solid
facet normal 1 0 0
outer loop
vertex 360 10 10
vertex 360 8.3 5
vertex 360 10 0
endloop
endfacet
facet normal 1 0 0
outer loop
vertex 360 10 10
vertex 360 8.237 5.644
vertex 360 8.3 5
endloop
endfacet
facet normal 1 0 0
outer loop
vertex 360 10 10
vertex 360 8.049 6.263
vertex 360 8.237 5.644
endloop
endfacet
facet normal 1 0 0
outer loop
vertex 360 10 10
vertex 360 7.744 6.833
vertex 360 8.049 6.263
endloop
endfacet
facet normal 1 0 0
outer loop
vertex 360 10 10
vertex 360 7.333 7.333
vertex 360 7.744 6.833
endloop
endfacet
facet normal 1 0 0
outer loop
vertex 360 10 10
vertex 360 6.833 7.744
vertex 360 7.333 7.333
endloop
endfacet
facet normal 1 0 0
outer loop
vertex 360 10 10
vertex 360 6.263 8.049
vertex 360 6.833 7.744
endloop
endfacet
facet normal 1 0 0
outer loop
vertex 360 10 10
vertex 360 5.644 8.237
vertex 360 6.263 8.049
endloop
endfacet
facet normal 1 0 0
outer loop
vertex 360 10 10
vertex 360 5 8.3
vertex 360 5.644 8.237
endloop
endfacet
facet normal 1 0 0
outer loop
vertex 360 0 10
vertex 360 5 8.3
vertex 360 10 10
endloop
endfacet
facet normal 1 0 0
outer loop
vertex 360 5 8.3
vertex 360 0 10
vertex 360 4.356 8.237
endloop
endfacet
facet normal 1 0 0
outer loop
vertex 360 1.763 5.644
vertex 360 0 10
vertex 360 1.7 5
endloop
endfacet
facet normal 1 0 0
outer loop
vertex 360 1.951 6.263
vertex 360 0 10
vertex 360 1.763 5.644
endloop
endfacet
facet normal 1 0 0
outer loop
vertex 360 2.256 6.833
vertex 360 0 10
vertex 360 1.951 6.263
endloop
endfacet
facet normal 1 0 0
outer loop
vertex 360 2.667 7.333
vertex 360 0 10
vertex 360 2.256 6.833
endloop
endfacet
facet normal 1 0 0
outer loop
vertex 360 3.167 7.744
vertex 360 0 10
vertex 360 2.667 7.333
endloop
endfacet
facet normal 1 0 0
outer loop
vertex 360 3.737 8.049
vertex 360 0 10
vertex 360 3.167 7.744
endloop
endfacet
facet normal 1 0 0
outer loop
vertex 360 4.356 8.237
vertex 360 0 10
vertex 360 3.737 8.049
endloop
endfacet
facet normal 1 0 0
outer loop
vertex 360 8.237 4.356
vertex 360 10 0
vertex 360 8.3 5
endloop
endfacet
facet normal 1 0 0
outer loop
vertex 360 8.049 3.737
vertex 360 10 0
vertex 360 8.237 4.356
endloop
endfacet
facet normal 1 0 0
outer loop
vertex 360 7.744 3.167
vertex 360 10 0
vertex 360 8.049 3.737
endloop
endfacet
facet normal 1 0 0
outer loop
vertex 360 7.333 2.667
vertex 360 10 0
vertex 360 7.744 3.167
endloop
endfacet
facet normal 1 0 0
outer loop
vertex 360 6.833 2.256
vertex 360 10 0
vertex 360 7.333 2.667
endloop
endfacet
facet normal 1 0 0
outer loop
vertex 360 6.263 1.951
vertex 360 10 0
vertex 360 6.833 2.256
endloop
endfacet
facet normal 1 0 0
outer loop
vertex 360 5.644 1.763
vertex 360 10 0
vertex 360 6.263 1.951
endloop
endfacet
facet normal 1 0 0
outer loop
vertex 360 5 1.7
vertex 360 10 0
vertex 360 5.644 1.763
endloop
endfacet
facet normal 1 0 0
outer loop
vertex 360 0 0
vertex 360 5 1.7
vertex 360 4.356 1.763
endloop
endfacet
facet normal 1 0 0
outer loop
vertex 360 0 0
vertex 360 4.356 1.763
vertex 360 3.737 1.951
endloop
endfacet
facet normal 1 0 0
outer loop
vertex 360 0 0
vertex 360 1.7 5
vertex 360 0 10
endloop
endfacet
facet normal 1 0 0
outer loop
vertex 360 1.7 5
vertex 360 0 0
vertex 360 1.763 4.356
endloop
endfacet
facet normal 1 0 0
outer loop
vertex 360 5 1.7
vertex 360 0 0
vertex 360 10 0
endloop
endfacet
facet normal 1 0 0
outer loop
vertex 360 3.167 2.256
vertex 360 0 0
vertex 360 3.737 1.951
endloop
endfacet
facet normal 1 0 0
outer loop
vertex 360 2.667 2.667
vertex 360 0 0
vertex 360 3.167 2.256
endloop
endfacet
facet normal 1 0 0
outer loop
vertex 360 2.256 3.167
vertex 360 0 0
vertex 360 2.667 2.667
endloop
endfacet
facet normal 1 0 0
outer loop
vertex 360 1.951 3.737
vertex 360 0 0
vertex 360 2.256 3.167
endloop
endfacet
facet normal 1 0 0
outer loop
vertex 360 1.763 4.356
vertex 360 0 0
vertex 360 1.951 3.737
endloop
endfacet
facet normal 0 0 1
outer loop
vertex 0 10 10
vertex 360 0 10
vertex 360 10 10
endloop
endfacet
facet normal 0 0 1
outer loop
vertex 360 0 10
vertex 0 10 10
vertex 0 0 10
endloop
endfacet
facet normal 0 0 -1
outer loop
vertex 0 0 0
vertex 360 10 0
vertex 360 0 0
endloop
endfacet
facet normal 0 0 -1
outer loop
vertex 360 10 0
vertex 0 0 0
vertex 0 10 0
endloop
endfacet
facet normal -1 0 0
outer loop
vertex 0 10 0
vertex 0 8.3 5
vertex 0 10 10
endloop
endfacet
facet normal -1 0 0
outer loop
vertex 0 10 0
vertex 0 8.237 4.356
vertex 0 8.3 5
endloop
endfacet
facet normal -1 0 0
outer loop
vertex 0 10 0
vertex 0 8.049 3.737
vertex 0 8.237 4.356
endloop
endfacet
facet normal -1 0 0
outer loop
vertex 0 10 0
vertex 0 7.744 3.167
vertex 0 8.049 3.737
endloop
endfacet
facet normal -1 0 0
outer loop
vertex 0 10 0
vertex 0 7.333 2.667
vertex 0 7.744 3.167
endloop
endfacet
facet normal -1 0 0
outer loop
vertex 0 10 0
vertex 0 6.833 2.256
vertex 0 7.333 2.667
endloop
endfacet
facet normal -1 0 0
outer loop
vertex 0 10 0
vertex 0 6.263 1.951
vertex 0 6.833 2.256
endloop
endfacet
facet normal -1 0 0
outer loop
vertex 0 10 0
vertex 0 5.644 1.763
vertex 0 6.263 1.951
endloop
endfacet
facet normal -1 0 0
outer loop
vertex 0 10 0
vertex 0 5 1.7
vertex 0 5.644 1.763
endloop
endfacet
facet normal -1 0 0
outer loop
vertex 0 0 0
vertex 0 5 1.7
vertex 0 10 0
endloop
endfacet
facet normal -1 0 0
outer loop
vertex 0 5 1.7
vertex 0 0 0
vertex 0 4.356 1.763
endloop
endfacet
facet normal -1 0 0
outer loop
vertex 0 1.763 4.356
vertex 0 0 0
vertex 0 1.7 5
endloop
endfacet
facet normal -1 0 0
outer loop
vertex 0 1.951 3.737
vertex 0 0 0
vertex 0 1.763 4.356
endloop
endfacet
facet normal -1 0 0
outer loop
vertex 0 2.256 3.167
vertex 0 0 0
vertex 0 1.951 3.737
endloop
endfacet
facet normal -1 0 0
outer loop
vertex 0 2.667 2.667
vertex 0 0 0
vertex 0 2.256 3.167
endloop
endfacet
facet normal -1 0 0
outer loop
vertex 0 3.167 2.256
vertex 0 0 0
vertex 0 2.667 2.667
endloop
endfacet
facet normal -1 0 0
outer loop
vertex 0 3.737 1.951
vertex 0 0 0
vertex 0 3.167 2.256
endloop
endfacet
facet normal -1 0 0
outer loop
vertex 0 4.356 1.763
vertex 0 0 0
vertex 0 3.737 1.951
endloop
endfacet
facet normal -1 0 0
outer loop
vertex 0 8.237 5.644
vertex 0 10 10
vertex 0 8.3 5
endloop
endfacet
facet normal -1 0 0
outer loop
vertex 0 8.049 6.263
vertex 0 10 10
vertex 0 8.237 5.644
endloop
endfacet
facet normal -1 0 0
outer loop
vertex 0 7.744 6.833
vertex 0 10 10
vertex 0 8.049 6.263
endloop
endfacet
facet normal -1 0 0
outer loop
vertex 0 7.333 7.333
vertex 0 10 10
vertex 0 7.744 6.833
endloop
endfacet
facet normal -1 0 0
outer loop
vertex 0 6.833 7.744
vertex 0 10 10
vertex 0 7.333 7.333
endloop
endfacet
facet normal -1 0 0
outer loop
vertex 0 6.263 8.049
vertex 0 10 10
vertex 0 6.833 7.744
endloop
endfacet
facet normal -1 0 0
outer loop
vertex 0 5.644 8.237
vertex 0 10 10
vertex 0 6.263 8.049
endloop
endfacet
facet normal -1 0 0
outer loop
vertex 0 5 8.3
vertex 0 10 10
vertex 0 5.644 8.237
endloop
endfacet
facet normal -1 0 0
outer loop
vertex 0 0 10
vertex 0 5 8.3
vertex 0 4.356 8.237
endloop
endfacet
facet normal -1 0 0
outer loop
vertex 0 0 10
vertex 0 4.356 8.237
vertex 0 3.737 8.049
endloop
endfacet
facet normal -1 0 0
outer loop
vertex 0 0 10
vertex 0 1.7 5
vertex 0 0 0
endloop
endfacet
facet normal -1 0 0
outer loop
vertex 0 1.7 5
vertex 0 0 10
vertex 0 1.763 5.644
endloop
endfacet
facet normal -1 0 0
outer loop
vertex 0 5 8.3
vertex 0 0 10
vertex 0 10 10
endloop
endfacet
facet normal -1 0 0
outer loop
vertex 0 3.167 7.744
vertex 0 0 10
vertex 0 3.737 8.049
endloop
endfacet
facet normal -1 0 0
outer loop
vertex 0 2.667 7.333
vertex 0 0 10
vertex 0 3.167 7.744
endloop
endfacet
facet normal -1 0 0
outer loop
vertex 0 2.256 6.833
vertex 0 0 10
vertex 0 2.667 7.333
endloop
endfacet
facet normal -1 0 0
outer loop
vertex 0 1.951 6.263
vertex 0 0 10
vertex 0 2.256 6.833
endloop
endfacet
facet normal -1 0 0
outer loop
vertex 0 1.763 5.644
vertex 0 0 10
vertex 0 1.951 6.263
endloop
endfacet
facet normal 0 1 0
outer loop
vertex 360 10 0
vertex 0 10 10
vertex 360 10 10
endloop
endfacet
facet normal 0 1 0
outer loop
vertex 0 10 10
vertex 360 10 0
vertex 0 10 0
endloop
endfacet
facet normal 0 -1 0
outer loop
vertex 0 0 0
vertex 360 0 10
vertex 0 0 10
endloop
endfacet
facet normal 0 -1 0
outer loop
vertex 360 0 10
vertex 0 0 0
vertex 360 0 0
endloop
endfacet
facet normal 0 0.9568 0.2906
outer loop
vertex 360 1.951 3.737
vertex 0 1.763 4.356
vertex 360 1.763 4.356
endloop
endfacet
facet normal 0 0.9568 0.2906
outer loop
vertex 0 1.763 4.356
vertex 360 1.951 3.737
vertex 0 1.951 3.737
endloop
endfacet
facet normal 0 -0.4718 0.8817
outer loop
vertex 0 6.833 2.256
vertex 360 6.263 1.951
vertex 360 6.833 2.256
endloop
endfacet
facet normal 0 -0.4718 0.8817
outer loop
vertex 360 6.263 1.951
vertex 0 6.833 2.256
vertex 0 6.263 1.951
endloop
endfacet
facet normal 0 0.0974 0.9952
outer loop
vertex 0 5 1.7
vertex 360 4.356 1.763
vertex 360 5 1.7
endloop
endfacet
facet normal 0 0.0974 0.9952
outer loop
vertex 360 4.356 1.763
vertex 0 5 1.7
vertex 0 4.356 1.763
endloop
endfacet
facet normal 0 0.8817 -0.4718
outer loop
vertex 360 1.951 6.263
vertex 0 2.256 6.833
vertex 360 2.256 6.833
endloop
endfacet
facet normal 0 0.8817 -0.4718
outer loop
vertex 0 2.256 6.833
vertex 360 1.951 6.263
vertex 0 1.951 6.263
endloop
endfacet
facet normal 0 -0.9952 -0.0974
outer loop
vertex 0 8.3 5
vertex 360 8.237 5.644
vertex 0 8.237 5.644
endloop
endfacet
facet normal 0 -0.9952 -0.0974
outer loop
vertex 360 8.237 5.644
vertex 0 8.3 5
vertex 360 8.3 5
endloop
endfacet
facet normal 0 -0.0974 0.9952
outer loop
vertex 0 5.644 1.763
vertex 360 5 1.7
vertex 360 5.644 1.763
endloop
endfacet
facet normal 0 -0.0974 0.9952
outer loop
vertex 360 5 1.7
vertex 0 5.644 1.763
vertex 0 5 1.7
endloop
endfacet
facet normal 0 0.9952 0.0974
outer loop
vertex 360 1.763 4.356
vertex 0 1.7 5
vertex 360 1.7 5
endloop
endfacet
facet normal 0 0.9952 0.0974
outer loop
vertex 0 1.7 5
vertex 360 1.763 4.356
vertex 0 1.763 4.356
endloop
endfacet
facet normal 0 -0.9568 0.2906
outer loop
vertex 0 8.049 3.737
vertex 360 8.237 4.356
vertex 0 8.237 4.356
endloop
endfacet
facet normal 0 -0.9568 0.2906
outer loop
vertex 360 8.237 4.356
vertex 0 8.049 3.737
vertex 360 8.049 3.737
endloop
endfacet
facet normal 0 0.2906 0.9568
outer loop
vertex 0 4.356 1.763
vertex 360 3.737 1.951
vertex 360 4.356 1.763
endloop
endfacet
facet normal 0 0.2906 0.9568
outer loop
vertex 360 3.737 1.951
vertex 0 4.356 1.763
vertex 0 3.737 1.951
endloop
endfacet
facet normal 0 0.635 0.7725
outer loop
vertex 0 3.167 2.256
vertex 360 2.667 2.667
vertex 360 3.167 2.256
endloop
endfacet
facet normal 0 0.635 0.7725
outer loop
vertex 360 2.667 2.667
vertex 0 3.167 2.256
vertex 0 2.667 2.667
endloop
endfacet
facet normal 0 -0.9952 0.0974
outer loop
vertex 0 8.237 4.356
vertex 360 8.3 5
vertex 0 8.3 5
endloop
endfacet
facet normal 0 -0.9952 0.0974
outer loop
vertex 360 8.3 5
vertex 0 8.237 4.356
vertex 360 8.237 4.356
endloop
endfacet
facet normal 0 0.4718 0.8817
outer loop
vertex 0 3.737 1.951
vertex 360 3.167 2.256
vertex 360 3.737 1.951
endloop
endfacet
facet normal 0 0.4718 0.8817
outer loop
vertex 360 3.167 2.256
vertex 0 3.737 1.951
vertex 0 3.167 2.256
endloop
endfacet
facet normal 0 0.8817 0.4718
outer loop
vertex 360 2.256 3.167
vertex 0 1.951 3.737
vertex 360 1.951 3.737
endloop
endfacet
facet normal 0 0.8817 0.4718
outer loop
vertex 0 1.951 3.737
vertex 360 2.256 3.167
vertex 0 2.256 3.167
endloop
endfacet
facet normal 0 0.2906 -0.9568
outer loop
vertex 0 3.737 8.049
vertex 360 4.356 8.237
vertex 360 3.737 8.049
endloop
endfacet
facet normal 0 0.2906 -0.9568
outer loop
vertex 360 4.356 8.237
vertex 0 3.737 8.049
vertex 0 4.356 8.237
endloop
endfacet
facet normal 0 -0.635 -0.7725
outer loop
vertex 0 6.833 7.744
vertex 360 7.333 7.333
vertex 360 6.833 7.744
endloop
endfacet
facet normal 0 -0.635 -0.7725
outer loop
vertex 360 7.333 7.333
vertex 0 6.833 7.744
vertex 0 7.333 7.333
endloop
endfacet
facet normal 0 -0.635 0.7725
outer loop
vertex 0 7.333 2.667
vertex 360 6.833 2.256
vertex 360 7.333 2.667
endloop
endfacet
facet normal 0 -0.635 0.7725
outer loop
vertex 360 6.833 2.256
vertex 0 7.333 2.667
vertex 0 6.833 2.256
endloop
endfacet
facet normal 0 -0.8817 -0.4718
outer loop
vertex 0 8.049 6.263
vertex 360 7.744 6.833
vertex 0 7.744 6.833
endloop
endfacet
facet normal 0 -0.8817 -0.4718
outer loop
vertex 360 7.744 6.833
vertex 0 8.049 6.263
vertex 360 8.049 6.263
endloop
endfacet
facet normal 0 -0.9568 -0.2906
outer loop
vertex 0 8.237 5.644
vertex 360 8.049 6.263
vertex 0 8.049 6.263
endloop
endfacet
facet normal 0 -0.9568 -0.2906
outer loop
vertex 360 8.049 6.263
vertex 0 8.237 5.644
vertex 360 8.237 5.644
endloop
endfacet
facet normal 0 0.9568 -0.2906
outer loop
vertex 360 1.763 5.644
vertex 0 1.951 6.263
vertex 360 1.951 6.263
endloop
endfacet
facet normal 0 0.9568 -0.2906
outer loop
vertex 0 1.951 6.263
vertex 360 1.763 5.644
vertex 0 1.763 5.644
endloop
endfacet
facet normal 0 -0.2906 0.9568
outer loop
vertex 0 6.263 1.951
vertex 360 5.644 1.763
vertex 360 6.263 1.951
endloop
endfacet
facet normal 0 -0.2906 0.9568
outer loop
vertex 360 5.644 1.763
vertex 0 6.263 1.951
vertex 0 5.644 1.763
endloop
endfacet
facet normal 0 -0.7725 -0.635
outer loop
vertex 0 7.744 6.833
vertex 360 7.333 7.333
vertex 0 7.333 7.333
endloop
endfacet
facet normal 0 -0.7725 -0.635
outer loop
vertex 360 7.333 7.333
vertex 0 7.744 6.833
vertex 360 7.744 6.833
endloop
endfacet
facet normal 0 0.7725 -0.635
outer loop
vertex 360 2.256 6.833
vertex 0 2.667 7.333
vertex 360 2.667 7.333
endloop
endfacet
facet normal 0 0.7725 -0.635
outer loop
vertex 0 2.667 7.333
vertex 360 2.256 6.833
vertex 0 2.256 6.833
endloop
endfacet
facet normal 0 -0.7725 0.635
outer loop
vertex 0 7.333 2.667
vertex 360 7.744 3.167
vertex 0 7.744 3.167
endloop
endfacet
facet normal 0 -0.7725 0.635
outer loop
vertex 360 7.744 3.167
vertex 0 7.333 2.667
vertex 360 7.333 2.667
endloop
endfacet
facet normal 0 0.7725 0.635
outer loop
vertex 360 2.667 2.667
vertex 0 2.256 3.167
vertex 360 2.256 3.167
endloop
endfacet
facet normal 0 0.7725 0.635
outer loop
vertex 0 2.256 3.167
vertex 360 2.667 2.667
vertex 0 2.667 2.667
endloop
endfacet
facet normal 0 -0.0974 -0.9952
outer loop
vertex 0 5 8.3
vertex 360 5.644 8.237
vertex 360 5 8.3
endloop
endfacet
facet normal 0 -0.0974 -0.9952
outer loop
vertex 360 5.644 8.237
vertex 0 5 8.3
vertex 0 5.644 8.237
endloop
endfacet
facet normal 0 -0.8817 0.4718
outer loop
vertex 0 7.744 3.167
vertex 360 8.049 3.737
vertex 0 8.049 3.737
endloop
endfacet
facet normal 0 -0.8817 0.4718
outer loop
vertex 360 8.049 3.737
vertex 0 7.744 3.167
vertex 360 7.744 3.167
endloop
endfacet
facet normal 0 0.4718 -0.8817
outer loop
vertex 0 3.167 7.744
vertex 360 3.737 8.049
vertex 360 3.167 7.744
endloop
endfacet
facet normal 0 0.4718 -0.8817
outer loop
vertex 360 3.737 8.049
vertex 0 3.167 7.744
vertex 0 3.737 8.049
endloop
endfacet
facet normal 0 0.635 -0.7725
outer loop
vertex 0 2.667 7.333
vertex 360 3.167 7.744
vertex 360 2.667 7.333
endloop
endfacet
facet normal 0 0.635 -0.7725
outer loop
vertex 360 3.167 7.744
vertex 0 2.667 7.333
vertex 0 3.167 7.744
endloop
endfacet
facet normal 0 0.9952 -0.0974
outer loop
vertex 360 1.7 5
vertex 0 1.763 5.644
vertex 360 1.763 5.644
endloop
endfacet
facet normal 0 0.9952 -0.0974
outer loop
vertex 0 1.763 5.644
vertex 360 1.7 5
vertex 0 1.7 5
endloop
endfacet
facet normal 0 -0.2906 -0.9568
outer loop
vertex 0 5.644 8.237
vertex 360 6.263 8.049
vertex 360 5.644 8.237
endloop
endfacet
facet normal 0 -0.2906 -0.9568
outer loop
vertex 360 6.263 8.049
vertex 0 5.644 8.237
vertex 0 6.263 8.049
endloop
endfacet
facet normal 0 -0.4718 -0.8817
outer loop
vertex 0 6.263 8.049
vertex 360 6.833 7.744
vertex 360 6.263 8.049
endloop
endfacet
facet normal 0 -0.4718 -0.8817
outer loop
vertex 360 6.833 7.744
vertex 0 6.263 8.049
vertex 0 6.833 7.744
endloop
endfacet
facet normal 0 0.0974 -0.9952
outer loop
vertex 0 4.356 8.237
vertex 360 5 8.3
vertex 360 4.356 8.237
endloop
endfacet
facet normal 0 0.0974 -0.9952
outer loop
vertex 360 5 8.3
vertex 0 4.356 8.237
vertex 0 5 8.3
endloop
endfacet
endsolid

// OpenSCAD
difference() {
    cube([360, 10, 10]);
    translate([0, 5, 5])
        rotate([0, 90, 0])
            cylinder(h=360, r=3.3, $fn=32);
}
